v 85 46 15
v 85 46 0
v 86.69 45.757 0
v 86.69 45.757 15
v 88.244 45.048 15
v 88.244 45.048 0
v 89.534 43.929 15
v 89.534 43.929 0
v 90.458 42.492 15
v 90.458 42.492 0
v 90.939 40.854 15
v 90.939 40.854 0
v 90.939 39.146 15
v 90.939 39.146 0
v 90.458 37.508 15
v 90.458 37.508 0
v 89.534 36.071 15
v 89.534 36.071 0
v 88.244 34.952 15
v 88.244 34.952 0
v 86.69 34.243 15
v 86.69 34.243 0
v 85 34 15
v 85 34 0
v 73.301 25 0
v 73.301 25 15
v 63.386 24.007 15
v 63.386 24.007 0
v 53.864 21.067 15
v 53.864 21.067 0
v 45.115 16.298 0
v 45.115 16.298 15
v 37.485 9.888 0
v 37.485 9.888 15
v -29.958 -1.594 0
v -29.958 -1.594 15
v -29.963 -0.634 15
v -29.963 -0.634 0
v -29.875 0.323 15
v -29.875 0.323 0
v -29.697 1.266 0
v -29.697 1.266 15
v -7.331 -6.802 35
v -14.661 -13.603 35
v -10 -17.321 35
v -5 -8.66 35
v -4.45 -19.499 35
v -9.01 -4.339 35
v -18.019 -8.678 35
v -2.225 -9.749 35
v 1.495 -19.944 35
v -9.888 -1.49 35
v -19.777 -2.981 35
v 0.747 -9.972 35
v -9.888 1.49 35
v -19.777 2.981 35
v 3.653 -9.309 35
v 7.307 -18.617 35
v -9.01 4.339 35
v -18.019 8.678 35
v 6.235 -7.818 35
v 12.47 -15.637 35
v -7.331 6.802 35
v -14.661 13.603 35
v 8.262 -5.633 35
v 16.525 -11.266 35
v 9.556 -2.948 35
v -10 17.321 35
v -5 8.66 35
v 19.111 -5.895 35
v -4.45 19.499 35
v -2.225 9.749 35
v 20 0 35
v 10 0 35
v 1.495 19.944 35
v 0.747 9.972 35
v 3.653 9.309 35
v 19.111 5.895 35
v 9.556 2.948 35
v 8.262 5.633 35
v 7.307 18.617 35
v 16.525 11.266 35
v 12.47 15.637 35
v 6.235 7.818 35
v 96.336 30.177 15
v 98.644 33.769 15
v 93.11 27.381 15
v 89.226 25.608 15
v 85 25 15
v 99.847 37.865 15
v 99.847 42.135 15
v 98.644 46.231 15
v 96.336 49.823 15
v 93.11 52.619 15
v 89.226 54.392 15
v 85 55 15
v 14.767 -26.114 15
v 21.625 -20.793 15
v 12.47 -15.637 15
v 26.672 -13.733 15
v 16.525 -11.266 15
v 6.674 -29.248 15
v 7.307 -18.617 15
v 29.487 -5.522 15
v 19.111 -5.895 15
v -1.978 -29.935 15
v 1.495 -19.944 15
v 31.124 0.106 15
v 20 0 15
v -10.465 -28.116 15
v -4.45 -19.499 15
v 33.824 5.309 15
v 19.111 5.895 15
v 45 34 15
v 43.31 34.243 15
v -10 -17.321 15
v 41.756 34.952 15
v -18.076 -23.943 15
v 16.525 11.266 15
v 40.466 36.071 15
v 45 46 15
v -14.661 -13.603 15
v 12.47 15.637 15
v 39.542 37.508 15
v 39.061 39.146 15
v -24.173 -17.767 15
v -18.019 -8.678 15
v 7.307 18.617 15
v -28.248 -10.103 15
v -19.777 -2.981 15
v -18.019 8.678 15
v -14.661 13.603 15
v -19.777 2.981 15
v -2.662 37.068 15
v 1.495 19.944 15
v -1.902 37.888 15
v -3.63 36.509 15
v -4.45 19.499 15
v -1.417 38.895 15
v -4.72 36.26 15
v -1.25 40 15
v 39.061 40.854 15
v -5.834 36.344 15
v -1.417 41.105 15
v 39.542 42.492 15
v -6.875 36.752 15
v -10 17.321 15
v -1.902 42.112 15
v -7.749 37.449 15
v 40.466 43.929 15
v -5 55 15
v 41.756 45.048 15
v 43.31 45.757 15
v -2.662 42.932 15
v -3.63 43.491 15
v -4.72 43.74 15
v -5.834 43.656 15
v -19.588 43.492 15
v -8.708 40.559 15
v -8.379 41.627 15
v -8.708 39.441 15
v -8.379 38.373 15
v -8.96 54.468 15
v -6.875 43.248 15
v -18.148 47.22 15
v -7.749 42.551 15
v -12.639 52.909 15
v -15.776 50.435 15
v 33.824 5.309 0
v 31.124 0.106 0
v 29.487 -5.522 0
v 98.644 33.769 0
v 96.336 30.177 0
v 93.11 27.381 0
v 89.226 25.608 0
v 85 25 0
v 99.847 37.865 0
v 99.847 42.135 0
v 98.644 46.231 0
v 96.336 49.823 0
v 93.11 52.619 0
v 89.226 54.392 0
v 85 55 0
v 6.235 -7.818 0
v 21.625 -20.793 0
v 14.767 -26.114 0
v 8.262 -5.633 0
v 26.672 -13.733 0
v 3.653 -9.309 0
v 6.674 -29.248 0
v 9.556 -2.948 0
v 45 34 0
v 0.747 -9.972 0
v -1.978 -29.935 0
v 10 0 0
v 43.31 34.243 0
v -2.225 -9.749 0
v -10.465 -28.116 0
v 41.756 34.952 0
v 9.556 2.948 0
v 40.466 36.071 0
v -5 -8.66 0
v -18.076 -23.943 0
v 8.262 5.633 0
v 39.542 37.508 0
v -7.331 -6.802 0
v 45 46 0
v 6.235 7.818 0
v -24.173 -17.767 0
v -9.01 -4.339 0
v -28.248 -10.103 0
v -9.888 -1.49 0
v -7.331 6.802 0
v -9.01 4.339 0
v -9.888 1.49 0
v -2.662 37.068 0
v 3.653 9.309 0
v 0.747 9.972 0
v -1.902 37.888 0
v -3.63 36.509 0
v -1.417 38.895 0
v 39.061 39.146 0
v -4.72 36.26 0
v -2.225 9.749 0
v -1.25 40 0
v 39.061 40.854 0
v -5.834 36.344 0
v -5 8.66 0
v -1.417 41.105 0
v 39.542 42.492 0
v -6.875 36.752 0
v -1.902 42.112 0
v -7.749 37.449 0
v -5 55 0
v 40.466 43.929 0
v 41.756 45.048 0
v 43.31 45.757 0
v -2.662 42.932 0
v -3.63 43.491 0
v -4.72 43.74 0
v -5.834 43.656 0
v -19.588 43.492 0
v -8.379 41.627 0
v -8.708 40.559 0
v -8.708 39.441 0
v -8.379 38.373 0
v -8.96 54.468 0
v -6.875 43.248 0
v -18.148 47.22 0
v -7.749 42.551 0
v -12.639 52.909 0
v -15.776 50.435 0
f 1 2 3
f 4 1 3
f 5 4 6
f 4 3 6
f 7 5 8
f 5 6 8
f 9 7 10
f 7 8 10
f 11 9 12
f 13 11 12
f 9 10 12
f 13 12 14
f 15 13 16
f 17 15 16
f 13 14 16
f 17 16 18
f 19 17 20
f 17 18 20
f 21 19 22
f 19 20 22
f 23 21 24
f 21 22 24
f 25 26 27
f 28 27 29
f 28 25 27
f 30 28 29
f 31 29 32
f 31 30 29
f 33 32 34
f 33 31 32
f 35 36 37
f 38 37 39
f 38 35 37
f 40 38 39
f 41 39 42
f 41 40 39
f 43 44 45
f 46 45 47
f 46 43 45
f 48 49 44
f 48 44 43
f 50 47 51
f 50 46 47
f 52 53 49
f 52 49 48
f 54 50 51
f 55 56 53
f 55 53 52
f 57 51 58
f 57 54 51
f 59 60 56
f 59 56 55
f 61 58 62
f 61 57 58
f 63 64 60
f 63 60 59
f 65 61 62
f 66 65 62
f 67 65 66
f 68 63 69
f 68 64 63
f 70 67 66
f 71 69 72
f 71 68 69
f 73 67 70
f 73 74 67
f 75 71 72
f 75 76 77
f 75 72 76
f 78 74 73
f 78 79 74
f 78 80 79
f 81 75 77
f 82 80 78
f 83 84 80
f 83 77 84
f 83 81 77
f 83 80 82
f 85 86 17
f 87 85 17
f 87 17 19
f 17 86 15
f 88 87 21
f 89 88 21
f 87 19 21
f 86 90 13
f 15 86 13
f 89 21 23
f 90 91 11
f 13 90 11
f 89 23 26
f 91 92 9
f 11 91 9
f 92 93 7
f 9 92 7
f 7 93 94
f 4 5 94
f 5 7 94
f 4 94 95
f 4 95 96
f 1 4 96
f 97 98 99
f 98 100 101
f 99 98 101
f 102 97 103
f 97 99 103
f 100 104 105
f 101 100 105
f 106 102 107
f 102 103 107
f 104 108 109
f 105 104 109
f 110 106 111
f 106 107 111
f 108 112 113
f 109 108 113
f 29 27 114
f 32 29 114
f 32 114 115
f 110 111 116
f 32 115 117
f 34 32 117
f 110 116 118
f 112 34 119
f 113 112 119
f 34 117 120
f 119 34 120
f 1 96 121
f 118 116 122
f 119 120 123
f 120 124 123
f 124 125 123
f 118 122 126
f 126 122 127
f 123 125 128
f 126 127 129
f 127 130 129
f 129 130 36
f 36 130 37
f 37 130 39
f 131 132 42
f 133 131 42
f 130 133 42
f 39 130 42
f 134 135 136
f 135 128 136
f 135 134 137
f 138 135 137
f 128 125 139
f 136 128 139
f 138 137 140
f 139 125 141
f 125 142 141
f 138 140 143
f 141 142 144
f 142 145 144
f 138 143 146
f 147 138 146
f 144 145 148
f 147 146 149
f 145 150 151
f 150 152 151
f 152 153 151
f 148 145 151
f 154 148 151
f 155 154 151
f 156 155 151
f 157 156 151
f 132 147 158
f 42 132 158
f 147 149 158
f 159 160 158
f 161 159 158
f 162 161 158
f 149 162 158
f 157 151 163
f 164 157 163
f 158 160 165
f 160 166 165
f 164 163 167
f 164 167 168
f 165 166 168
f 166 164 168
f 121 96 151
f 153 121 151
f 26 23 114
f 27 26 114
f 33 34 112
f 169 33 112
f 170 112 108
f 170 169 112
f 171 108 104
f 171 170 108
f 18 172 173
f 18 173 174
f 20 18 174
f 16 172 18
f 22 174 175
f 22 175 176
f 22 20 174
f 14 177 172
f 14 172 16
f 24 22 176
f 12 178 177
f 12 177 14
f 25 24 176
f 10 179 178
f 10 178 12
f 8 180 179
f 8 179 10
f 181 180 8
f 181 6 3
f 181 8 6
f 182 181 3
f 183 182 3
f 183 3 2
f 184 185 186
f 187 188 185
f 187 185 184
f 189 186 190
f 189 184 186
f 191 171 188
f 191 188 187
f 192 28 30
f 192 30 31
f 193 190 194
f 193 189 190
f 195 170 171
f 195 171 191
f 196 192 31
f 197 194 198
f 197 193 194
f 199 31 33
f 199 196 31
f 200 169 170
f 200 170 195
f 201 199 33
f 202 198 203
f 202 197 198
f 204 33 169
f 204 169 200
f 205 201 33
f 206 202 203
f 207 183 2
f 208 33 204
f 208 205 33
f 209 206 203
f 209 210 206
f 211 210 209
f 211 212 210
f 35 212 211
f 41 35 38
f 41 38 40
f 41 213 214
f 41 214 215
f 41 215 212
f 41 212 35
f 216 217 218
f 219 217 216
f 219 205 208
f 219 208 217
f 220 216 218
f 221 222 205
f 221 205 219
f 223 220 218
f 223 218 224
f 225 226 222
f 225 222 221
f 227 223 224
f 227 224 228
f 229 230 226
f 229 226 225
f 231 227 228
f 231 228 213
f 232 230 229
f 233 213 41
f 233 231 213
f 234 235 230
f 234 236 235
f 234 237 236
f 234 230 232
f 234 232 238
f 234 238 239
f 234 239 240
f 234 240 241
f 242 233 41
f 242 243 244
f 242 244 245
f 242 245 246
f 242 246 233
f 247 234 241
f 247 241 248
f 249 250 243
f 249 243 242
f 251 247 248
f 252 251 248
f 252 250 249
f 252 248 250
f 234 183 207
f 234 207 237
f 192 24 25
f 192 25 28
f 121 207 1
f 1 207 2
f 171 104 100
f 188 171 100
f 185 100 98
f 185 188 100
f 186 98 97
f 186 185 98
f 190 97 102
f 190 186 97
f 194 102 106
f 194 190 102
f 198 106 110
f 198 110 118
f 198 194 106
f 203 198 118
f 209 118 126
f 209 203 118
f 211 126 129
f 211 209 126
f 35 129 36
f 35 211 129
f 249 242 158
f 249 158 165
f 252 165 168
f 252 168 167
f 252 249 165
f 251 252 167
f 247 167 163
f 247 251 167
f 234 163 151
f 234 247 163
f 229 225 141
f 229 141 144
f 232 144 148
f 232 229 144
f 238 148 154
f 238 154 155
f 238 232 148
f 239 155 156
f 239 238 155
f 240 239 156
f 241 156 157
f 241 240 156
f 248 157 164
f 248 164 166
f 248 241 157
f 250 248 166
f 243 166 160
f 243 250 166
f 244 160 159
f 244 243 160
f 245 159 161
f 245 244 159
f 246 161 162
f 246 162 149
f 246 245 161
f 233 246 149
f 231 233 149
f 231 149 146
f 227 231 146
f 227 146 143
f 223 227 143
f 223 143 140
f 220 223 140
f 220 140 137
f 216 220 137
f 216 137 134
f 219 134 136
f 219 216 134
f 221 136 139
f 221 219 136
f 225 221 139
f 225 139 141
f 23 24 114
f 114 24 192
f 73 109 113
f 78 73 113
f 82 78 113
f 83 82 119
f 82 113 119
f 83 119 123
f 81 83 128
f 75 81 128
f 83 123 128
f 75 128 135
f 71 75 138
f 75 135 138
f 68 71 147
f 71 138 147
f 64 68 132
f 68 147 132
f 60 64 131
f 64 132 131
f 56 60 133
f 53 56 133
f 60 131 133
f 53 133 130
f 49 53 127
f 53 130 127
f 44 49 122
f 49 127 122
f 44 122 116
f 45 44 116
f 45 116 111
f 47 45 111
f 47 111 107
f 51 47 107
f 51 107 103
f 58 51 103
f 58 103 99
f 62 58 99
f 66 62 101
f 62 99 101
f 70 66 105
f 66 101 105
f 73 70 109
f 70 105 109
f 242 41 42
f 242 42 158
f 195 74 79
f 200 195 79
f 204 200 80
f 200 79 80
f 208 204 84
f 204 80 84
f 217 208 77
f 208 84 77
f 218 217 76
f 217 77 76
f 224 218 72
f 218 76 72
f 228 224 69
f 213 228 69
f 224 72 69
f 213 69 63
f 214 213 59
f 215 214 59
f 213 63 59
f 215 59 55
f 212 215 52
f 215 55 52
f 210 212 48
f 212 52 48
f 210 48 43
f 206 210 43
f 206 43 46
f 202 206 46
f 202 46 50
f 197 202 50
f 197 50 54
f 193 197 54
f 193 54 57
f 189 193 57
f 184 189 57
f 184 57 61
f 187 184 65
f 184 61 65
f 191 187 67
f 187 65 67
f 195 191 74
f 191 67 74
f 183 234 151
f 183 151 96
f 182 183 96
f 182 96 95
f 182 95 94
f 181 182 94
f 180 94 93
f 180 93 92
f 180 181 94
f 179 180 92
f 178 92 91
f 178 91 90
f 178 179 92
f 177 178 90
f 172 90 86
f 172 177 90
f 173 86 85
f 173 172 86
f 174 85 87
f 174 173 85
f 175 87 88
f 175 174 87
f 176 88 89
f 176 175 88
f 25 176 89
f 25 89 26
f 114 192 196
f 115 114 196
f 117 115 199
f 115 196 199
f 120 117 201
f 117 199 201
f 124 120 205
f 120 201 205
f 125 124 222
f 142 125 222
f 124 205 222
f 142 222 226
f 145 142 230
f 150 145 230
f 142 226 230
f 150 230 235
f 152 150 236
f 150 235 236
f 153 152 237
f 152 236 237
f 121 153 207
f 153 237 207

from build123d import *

# Parameters (mm, degrees)
SKETCH1_R           = 3.75
BOSS_EXTRUDE1_DEPTH = 15
SKETCH2_R           = 20
BOSS_EXTRUDE2_DEPTH = 20
SKETCH4_R           = 10
CUT_EXTRUDE1_DEPTH  = 35


with BuildPart() as part:
    # Sketch1 → Boss-Extrude1 (new body)
    with BuildSketch(Plane.XY):
        with BuildLine():
            Line((45, 55), (85, 55))
            ThreePointArc((85, 55), (100, 40), (85, 25))
            Line((85, 25), (73.301270189, 25))
            ThreePointArc((73.301270189, 25), (53.864269805, 21.067374747), (37.484806964, 9.888120643))
            ThreePointArc((37.484806964, 9.888120643), (32.346878, 2.774072366), (29.48734245, -5.522375871))
            ThreePointArc((29.48734245, -5.522375871), (-1.978417772, -29.934693303), (-29.957644649, -1.593589371))
            ThreePointArc((-29.957644649, -1.593589371), (-29.930461106, -0.154464501), (-29.696951333, 1.265849732))
            Line((-29.696951333, 1.265849732), (-19.587782351, 43.492363969))
            ThreePointArc((-19.587782351, 43.492363969), (-14.290170624, 51.776787753), (-5, 55))
            Line((-5, 55), (45, 55))
        make_face()
        with Locations((-5, 40)):
            Circle(SKETCH1_R, mode=Mode.SUBTRACT)
        with BuildLine():
            Line((45, 46), (85, 46))
            ThreePointArc((85, 46), (91, 40), (85, 34))
            Line((85, 34), (45, 34))
            ThreePointArc((45, 34), (39, 40), (45, 46))
        make_face(mode=Mode.SUBTRACT)
    extrude(amount=BOSS_EXTRUDE1_DEPTH)

    # Sketch2 → Boss-Extrude2 (add)
    with BuildSketch(Plane.XY.offset(15)):
        Circle(SKETCH2_R)
    extrude(amount=BOSS_EXTRUDE2_DEPTH)

    # Sketch4 → Cut-Extrude1 (cut)
    with BuildSketch(Plane.XY.offset(35)):
        Circle(SKETCH4_R)
    extrude(amount=-CUT_EXTRUDE1_DEPTH, mode=Mode.SUBTRACT)


solid = part.part
